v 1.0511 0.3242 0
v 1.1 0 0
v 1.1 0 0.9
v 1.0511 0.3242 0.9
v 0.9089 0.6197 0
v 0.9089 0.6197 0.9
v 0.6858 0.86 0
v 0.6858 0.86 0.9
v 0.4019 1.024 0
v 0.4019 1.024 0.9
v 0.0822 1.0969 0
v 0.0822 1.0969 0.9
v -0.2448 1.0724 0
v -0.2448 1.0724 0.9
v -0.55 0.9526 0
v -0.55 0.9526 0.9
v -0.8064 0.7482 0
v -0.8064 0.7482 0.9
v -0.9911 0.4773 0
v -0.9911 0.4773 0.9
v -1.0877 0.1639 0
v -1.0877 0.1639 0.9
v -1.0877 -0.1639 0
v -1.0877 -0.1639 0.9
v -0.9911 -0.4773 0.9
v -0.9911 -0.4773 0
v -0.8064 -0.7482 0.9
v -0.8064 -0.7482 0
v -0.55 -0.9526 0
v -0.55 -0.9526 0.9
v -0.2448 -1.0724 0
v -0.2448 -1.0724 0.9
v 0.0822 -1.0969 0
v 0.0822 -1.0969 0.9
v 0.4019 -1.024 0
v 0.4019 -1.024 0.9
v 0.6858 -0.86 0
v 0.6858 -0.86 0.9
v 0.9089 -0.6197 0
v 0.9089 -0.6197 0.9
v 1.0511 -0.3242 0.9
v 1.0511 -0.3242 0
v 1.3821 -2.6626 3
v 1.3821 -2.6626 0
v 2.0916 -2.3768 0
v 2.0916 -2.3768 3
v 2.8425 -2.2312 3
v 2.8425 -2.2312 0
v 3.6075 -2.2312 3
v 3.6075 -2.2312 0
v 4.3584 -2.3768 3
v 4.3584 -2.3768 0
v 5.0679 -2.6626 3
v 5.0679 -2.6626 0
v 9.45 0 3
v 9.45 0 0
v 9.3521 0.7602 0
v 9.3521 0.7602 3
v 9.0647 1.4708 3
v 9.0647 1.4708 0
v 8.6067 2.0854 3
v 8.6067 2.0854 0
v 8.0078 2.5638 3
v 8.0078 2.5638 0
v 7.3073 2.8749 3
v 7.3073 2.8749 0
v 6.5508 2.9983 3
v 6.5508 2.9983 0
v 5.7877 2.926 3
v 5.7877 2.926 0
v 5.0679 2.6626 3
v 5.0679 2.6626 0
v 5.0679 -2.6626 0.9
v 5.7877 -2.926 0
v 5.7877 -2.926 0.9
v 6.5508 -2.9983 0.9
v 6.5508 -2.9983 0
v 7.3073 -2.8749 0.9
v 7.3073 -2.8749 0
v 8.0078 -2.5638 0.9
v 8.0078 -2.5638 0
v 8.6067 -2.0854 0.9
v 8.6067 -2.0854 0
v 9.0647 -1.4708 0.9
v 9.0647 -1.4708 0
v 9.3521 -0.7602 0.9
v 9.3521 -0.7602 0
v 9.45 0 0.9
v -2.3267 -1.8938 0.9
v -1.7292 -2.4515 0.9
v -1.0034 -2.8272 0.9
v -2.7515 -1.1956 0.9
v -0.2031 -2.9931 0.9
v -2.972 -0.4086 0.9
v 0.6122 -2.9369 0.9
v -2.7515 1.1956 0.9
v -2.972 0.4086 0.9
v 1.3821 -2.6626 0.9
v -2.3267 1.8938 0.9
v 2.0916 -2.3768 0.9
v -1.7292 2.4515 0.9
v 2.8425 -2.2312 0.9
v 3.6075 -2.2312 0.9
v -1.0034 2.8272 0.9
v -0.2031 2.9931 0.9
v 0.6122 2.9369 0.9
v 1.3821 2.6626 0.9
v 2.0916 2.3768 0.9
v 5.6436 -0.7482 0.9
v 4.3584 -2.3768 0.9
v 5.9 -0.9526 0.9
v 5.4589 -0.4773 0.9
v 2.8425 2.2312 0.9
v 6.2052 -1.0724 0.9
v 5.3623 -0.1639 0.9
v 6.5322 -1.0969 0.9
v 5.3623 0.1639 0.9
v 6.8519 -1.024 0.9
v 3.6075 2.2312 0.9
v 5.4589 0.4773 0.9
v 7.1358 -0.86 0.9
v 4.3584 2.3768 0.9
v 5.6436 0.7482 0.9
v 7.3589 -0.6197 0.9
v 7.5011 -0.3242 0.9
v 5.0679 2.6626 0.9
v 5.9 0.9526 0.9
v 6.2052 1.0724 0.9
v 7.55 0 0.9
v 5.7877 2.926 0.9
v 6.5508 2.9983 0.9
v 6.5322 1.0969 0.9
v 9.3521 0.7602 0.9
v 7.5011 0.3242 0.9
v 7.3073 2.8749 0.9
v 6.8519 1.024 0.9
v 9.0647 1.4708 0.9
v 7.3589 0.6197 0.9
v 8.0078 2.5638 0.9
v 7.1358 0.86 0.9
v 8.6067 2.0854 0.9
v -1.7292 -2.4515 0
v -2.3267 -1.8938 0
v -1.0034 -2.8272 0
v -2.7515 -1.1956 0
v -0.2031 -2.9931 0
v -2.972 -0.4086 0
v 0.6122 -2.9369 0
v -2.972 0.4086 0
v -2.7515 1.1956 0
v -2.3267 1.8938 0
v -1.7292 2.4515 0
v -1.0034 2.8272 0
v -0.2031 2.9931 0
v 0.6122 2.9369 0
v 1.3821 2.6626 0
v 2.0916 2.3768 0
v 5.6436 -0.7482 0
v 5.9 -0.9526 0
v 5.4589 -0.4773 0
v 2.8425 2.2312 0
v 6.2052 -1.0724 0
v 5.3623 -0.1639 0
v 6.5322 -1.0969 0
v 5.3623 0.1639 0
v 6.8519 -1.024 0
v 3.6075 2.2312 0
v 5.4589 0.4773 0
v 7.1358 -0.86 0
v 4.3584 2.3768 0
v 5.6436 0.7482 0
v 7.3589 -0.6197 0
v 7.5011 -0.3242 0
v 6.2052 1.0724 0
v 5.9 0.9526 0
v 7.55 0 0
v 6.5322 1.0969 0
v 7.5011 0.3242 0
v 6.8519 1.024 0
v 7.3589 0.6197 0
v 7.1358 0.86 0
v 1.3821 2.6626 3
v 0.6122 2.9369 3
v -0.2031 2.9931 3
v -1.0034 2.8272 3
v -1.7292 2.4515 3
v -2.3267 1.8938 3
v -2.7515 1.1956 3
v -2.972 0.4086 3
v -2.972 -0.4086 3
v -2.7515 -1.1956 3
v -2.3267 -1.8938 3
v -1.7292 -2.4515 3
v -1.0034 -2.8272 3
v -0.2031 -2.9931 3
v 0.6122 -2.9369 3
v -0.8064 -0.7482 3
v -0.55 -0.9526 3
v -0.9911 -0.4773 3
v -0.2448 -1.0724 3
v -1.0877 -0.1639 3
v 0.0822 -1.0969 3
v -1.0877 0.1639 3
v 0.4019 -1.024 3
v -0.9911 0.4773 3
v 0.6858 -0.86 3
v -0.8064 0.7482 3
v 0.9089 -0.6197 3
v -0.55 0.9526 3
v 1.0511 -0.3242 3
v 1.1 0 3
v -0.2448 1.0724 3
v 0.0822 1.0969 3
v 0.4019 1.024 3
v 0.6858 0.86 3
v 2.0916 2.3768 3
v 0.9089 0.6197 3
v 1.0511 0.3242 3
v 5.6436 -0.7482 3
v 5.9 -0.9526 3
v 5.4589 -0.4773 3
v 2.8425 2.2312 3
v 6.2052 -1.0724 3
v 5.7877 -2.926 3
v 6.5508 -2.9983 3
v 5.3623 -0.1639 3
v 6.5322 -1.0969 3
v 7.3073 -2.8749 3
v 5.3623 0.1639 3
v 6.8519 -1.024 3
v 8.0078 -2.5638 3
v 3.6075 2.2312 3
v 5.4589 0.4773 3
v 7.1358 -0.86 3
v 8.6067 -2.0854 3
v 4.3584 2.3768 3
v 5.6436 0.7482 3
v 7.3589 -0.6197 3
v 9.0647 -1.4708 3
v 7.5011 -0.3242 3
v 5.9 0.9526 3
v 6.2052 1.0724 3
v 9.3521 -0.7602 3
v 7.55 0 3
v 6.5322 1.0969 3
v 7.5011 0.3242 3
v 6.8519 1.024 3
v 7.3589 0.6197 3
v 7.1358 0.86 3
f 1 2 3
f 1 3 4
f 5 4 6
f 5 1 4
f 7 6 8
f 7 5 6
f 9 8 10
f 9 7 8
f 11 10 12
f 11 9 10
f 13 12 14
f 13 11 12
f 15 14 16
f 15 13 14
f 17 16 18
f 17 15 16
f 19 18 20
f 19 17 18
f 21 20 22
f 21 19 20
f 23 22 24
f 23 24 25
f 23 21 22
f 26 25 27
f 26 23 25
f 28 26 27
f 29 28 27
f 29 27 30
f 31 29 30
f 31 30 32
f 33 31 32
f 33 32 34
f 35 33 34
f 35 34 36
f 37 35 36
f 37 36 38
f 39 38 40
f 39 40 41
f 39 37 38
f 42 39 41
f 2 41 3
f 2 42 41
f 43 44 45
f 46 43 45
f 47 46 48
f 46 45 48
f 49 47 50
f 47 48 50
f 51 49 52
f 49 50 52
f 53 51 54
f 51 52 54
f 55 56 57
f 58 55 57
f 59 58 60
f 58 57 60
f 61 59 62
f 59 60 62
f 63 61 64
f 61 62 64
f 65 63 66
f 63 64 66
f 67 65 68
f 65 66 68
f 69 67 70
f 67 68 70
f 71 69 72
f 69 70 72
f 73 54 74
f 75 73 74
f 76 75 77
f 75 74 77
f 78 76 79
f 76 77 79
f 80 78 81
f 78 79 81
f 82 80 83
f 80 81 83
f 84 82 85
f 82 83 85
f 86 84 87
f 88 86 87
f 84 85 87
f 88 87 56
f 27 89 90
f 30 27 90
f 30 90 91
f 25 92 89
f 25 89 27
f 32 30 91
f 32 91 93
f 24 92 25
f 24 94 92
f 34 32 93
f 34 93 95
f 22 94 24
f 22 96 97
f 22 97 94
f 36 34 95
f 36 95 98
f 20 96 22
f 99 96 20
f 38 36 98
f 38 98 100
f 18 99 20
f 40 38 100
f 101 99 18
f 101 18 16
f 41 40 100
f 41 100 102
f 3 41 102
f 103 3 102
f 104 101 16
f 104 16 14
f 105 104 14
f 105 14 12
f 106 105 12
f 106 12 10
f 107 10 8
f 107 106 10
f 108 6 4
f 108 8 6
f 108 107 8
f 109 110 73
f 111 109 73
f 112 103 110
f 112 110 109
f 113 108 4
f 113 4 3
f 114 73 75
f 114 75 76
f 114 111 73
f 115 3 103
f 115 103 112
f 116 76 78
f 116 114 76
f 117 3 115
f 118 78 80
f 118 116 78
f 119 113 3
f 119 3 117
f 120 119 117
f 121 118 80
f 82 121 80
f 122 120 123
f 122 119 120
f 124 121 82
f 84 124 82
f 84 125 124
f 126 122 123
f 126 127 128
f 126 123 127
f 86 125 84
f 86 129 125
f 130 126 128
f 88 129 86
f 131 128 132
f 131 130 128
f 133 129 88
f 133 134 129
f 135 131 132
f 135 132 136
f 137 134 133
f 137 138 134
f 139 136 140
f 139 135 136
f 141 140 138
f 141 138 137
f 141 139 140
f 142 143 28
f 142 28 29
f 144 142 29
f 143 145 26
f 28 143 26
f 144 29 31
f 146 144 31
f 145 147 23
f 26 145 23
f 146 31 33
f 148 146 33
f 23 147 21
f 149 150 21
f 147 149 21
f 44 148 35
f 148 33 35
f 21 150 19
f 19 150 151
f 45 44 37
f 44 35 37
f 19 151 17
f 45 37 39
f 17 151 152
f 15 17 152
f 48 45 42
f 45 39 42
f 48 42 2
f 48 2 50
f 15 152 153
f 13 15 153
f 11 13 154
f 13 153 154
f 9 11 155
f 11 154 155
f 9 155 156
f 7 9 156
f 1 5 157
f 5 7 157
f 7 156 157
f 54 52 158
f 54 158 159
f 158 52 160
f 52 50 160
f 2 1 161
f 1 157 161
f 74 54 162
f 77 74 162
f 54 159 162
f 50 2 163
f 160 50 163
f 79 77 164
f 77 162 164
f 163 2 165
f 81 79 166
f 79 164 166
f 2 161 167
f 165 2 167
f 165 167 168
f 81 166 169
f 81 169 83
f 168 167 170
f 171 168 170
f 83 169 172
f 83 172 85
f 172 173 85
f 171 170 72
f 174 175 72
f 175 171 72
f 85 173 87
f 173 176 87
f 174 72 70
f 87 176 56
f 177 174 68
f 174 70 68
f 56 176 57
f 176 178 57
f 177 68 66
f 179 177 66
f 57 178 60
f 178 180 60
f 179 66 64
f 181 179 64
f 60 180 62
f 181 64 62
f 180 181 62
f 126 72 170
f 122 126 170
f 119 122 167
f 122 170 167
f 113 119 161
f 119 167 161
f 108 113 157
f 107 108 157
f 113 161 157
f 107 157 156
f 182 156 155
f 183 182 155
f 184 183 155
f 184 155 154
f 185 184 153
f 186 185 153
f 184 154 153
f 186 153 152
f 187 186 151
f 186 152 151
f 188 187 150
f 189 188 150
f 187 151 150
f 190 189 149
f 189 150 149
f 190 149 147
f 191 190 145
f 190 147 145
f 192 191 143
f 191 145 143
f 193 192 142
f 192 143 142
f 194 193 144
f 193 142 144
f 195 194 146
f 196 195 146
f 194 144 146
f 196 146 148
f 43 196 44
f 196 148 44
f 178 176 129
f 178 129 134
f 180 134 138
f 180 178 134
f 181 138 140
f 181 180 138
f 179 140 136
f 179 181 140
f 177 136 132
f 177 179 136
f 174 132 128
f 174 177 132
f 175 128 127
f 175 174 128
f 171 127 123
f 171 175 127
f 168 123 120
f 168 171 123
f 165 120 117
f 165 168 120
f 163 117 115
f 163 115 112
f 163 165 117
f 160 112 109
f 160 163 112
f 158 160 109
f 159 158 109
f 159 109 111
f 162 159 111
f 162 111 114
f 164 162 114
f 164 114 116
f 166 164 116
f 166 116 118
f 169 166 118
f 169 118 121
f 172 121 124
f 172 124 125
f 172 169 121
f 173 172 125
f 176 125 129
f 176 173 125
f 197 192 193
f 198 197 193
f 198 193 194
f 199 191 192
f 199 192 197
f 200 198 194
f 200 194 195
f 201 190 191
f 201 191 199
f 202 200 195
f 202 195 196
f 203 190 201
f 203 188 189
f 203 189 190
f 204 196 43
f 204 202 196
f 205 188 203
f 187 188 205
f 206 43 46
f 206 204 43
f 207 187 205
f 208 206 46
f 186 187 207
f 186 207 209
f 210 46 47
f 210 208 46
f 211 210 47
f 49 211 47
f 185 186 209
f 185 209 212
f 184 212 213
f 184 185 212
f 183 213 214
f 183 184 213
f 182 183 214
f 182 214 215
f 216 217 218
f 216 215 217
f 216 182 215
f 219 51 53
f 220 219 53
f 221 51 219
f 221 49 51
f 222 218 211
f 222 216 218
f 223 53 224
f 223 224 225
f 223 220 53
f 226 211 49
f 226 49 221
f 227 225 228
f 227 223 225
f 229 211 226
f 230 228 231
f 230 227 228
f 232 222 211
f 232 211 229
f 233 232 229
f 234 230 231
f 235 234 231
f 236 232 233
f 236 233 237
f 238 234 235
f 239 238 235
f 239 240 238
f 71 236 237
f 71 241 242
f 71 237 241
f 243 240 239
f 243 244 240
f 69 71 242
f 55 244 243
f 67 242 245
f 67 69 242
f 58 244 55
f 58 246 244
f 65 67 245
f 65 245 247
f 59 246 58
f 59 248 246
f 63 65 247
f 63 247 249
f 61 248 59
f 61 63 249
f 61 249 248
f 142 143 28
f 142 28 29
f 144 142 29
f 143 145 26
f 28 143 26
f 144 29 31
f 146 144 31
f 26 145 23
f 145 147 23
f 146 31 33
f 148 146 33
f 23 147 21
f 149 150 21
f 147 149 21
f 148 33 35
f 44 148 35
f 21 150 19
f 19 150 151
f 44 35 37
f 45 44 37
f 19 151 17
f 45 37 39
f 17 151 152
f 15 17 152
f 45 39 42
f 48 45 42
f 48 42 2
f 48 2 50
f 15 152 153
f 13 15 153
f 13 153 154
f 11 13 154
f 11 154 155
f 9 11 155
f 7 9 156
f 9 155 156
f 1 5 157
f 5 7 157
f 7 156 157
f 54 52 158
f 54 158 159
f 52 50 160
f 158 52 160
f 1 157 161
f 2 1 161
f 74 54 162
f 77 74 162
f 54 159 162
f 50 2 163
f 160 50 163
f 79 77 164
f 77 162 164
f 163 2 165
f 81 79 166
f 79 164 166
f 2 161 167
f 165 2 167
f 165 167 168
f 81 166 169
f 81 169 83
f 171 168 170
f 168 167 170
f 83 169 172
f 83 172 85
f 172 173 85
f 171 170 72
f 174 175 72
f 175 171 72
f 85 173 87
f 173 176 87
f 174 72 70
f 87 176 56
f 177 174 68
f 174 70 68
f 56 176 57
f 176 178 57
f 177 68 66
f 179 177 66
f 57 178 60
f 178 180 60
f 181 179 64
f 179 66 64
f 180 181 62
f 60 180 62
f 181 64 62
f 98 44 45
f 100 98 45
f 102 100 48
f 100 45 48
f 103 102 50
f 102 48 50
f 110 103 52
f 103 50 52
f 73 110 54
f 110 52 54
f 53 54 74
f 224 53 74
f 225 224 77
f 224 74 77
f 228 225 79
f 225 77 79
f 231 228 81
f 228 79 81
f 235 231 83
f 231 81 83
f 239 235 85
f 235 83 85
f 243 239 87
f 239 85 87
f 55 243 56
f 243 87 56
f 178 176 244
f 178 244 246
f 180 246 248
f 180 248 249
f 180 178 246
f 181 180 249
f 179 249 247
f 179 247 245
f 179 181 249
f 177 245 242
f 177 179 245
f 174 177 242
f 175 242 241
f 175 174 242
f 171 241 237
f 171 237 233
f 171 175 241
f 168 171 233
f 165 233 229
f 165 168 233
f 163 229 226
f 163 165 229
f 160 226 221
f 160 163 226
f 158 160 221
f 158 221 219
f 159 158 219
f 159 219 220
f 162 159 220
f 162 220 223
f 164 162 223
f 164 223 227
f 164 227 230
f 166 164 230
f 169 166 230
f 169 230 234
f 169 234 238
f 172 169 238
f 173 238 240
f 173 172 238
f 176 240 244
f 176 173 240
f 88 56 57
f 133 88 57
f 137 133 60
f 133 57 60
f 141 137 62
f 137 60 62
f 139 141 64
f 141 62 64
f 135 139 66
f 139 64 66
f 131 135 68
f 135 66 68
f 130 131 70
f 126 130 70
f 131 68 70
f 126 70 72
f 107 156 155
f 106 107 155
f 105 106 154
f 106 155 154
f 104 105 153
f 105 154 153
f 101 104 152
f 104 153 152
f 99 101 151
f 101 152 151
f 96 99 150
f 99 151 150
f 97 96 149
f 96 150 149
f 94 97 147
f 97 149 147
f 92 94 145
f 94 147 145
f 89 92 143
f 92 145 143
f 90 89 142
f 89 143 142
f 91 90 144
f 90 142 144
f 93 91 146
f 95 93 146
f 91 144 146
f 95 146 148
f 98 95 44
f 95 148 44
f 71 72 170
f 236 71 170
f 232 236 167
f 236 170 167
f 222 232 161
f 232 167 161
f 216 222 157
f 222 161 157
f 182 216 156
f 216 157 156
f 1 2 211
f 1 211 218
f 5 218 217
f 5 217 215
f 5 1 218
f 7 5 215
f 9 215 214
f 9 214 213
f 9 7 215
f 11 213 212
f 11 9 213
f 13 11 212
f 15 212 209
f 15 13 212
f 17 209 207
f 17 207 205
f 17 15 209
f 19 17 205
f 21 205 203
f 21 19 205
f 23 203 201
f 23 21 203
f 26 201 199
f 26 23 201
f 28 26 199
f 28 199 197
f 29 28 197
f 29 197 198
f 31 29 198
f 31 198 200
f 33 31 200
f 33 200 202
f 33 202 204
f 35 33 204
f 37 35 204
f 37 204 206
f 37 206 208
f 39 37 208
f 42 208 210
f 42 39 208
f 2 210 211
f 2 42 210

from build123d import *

# Parameters (mm, degrees)
F0_R     = 1.1
F1_DEPTH = 0.9
F2_DEPTH = 3


with BuildPart() as f1:
    # F0 (on Top) → F1 (new body)
    with BuildSketch(Plane.XY):
        with BuildLine():
            ThreePointArc((9.45, 0), (8.007814, 2.563828), (5.067857, 2.662646))
            ThreePointArc((5.067857, 2.662646), (3.45, 0), (5.067857, -2.662646))
            ThreePointArc((5.067857, -2.662646), (8.007814, -2.563828), (9.45, 0))
        make_face()
        with Locations((6.45, 0)):
            Circle(F0_R, mode=Mode.SUBTRACT)
        with BuildLine():
            ThreePointArc((1.382143, -2.662646), (2.563828, -1.557814), (3, 0))
            ThreePointArc((3, 0), (2.563828, 1.557814), (1.382143, 2.662646))
            ThreePointArc((1.382143, 2.662646), (-3, 0), (1.382143, -2.662646))
        make_face()
        Circle(F0_R, mode=Mode.SUBTRACT)
        with BuildLine():
            ThreePointArc((1.382143, 2.662646), (2.563828, 1.557814), (3, 0))
            ThreePointArc((3, 0), (2.563828, -1.557814), (1.382143, -2.662646))
            ThreePointArc((1.382143, -2.662646), (3.225, -2.21284), (5.067857, -2.662646))
            ThreePointArc((5.067857, -2.662646), (3.45, 0), (5.067857, 2.662646))
            ThreePointArc((5.067857, 2.662646), (3.225, 2.21284), (1.382143, 2.662646))
        make_face()
    extrude(amount=F1_DEPTH)


with BuildPart() as f2:
    # F0 (on Top) → F2 (new body)
    with BuildSketch(Plane.XY):
        with BuildLine():
            ThreePointArc((1.382143, -2.662646), (2.563828, -1.557814), (3, 0))
            ThreePointArc((3, 0), (2.563828, 1.557814), (1.382143, 2.662646))
            ThreePointArc((1.382143, 2.662646), (-3, 0), (1.382143, -2.662646))
        make_face()
        Circle(F0_R, mode=Mode.SUBTRACT)
        with BuildLine():
            ThreePointArc((1.382143, 2.662646), (2.563828, 1.557814), (3, 0))
            ThreePointArc((3, 0), (2.563828, -1.557814), (1.382143, -2.662646))
            ThreePointArc((1.382143, -2.662646), (3.225, -2.21284), (5.067857, -2.662646))
            ThreePointArc((5.067857, -2.662646), (3.45, 0), (5.067857, 2.662646))
            ThreePointArc((5.067857, 2.662646), (3.225, 2.21284), (1.382143, 2.662646))
        make_face()
        with BuildLine():
            ThreePointArc((9.45, 0), (8.007814, 2.563828), (5.067857, 2.662646))
            ThreePointArc((5.067857, 2.662646), (3.45, 0), (5.067857, -2.662646))
            ThreePointArc((5.067857, -2.662646), (8.007814, -2.563828), (9.45, 0))
        make_face()
        with Locations((6.45, 0)):
            Circle(F0_R, mode=Mode.SUBTRACT)
    extrude(amount=F2_DEPTH)


solid = Compound([f1.part, f2.part])
